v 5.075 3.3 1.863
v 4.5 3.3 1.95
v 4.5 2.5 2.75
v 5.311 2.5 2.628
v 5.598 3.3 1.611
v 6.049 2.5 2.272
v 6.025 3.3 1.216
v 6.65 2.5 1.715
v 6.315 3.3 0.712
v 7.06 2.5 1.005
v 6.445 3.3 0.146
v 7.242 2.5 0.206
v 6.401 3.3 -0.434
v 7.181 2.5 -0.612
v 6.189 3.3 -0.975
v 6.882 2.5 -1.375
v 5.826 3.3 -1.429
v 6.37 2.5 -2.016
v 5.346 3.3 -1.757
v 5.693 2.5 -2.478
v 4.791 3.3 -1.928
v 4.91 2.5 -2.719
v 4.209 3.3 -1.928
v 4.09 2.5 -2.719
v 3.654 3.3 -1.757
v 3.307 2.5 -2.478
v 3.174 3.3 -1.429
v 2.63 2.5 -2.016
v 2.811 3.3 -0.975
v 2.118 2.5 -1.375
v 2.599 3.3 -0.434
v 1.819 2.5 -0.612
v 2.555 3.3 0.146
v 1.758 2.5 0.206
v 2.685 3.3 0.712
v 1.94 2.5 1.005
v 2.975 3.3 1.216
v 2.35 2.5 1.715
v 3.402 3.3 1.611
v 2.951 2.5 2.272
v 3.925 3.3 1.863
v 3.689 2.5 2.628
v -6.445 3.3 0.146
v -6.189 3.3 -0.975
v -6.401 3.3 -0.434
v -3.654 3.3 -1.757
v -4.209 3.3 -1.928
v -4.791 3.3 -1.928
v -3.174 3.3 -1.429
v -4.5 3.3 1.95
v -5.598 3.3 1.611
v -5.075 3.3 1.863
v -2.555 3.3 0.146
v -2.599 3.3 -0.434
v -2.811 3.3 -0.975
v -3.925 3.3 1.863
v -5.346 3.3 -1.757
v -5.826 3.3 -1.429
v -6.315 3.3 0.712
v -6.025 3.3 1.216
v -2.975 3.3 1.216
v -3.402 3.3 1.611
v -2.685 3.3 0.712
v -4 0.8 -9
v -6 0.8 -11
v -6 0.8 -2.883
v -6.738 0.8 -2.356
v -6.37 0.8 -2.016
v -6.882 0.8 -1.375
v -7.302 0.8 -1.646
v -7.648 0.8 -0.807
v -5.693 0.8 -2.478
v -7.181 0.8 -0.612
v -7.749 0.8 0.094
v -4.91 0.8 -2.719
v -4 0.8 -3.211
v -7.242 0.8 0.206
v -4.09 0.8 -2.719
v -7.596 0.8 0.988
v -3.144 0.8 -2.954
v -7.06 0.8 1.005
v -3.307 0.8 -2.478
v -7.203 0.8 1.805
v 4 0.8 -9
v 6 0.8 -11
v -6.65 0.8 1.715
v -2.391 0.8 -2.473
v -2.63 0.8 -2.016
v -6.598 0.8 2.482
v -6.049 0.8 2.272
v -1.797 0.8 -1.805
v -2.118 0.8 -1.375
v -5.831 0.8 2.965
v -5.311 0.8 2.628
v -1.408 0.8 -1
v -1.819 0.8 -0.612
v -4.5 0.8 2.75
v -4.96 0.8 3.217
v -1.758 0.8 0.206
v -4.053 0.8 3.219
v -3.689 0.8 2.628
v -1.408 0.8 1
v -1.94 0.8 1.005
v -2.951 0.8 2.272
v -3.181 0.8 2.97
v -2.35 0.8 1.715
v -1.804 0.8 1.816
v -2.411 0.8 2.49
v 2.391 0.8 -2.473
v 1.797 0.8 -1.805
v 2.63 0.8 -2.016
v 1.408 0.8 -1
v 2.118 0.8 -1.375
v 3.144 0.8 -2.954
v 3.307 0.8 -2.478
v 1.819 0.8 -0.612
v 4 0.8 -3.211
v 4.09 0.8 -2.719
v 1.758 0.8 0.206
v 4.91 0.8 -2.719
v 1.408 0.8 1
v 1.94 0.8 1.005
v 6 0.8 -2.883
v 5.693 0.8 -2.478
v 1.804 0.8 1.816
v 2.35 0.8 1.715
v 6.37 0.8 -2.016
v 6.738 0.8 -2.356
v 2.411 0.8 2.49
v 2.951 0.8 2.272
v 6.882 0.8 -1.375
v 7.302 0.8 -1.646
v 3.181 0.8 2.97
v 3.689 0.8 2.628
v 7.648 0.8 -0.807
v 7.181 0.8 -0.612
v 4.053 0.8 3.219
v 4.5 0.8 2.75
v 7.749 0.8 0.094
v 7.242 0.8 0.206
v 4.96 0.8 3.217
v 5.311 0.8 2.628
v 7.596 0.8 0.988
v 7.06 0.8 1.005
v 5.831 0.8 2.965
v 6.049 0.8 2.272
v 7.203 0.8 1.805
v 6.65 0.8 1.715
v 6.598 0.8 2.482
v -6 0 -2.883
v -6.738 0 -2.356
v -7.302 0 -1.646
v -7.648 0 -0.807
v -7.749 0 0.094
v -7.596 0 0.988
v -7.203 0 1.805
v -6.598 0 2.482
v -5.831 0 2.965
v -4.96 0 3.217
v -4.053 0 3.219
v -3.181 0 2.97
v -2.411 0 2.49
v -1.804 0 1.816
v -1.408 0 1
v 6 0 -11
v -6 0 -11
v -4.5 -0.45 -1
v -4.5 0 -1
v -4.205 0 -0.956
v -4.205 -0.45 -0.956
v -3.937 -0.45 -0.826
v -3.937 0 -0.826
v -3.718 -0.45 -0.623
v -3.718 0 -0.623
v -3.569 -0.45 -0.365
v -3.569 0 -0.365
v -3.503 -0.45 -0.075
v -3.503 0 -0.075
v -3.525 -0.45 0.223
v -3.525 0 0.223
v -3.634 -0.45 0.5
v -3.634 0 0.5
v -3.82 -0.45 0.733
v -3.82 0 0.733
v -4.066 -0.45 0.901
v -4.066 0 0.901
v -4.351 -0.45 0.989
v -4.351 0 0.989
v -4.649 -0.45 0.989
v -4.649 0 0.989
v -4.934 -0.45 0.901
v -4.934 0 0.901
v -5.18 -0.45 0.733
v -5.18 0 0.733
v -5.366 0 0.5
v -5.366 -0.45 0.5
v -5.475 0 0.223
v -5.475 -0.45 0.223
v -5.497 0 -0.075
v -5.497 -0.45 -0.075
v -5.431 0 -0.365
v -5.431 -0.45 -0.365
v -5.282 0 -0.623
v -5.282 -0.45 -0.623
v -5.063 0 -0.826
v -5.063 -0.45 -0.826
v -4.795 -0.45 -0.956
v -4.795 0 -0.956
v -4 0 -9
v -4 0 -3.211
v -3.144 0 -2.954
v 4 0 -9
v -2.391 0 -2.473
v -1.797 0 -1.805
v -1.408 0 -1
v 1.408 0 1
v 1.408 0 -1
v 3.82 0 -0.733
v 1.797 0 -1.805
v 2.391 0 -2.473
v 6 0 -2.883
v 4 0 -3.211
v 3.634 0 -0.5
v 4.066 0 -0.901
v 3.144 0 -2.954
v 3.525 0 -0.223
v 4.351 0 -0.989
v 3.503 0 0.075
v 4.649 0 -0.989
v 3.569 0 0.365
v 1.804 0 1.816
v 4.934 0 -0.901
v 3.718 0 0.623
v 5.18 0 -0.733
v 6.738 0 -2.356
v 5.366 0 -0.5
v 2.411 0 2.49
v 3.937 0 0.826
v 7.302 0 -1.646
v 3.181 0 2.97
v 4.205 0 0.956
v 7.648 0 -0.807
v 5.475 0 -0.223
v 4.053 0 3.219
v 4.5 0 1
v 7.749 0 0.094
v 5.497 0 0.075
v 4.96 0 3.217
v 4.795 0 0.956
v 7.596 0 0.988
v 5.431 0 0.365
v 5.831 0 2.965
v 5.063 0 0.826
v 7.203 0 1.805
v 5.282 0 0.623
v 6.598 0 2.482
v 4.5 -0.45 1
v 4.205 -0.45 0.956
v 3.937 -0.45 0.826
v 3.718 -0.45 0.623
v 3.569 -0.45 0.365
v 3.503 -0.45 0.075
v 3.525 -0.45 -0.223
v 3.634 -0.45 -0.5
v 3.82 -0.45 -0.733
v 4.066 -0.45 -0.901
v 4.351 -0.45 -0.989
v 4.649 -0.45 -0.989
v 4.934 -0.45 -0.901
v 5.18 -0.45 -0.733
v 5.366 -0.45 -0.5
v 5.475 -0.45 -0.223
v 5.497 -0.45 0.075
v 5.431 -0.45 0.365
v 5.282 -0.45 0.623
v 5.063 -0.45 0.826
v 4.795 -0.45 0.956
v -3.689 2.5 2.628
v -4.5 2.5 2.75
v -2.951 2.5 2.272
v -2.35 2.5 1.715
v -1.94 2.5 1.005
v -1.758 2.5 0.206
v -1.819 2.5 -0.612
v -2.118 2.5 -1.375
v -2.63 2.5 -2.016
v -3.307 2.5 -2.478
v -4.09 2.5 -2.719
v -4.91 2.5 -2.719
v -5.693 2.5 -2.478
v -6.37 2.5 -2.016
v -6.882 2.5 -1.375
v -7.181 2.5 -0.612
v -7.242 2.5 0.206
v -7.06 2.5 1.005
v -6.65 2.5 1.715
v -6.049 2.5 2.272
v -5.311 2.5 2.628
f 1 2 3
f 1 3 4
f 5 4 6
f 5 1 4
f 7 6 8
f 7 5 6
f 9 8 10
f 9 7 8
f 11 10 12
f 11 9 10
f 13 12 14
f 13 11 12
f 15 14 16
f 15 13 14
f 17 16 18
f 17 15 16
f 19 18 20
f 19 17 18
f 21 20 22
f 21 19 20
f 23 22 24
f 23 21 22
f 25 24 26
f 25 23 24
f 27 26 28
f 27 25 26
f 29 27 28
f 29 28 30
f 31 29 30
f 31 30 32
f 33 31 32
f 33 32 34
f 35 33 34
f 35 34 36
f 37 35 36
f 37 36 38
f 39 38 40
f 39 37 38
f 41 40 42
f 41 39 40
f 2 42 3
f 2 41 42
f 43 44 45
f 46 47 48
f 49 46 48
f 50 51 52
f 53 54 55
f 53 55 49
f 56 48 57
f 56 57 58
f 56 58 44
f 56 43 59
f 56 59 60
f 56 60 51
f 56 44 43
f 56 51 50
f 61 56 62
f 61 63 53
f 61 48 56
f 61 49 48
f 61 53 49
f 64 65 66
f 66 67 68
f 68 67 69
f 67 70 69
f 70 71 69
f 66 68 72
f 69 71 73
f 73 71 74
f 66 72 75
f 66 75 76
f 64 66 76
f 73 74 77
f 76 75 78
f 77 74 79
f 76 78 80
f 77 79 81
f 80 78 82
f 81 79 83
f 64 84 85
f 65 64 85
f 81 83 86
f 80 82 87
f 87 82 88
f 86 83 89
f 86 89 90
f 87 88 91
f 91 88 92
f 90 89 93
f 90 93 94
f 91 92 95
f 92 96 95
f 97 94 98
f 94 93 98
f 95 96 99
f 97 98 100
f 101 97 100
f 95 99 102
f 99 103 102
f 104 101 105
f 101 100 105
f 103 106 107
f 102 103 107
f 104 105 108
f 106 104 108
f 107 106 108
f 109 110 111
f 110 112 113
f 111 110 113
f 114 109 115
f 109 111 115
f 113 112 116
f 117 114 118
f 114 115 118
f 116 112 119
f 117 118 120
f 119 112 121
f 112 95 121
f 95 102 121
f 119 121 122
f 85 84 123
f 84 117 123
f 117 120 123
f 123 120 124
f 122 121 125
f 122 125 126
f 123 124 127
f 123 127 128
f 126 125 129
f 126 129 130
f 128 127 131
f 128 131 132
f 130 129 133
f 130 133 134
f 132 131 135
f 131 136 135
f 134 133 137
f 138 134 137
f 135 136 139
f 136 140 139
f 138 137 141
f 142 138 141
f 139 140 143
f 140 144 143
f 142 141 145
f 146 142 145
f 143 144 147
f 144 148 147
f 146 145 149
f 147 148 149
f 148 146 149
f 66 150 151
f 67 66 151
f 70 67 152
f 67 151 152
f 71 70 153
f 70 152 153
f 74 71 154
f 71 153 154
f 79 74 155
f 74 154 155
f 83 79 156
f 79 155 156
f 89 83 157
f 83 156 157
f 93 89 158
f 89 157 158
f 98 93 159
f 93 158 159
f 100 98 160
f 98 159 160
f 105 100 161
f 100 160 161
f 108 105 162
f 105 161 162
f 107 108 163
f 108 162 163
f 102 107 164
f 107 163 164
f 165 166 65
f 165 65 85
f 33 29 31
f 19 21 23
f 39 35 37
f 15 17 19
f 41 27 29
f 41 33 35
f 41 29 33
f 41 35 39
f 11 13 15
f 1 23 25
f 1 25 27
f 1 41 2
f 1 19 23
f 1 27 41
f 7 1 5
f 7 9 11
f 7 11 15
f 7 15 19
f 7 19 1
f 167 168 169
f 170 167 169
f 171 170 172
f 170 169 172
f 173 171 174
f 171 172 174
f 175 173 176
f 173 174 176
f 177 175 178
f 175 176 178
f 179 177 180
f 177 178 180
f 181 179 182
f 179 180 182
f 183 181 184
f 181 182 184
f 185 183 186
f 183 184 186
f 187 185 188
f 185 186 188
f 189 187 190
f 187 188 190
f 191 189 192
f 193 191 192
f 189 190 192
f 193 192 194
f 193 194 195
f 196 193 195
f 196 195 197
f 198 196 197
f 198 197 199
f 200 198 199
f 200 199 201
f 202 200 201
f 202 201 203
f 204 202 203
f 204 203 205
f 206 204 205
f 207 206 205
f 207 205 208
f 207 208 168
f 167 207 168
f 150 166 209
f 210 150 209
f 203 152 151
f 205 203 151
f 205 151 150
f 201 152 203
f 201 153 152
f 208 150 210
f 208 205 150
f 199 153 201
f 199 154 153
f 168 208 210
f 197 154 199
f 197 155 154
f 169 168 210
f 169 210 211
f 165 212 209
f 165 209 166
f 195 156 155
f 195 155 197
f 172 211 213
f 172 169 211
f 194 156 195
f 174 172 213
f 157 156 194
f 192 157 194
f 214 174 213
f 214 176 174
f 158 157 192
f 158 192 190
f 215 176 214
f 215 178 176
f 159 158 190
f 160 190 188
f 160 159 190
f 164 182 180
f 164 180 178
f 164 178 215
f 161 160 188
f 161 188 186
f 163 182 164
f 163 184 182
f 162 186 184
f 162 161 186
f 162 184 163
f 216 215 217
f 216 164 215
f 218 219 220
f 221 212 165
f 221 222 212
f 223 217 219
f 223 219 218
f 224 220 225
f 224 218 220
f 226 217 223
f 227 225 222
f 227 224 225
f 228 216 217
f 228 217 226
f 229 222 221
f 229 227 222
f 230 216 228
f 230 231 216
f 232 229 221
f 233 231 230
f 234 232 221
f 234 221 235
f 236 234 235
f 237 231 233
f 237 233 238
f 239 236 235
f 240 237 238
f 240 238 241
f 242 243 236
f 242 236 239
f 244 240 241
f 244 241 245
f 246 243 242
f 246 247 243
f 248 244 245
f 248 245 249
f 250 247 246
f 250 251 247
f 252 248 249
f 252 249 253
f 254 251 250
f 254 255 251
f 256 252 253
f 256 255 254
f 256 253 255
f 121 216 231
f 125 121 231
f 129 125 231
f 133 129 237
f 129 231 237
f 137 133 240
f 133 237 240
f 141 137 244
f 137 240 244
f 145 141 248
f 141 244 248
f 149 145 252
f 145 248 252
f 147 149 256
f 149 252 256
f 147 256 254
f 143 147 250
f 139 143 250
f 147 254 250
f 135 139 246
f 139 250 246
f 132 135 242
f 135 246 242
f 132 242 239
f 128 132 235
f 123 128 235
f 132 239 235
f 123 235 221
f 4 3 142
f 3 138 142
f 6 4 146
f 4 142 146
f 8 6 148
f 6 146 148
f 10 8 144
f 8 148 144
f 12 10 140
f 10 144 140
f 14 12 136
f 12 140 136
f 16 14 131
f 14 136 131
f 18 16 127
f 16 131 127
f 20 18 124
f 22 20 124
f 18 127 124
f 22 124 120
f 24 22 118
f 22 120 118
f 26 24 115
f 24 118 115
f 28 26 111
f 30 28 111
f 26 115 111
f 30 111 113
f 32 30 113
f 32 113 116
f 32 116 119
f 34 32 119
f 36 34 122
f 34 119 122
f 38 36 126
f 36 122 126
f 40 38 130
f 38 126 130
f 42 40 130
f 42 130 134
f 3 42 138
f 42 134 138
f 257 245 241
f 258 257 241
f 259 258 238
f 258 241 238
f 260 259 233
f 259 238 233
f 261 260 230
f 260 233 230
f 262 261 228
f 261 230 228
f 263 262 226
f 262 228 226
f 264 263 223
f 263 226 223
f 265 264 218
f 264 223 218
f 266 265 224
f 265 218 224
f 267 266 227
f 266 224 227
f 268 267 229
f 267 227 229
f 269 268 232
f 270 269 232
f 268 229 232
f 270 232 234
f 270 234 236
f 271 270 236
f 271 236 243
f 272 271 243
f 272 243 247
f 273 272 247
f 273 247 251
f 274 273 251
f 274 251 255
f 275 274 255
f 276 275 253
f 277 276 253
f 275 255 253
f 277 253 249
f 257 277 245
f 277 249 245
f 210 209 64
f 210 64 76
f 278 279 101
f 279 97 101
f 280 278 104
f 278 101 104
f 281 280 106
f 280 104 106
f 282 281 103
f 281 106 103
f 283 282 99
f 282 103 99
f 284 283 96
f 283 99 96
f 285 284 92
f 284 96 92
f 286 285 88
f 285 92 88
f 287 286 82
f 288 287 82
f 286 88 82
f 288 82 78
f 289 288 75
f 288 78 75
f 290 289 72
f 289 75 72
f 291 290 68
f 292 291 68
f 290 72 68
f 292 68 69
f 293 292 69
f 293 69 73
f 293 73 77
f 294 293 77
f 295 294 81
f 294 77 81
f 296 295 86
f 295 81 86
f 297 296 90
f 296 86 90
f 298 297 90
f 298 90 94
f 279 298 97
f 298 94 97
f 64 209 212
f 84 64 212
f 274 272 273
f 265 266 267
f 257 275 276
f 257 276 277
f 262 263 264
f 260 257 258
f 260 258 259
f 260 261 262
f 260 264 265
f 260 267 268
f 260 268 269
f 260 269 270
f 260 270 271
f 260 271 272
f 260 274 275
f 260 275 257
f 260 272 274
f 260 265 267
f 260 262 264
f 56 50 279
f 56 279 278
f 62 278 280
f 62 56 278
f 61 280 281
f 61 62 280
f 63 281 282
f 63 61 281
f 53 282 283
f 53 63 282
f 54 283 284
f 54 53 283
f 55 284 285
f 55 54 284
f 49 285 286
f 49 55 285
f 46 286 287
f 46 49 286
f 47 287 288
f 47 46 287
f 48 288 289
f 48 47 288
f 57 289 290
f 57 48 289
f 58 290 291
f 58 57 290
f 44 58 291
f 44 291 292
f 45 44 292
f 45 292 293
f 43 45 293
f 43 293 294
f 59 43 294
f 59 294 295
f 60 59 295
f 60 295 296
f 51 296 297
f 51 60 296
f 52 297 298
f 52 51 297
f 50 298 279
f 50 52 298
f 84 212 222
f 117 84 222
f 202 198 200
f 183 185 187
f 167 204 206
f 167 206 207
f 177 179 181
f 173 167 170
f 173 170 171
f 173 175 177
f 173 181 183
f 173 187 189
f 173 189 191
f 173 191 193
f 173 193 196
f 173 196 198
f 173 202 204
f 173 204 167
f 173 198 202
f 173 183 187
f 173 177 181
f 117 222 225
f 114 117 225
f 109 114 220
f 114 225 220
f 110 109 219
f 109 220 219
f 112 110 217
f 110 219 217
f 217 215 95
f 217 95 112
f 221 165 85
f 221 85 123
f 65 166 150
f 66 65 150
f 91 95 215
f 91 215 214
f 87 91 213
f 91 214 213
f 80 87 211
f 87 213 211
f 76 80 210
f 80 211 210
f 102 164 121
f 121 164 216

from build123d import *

# Parameters (mm, degrees)
SKETCH_1_R      = 3.25
EXTRUDE_1_DEPTH = 0.8
SKETCH_2_R      = 2.75
EXTRUDE_2_DEPTH = 2.5
CHAMFER_1_SIZE  = 0.8
SKETCH_3_R      = 1
EXTRUDE_3_DEPTH = 0.45
SKETCH_4_W      = 12
SKETCH_4_H      = 12
SKETCH_4_W_2    = 8
SKETCH_4_H_2    = 8
EXTRUDE_4_DEPTH = 0.8


with BuildPart() as part:
    # 草图1 → 凸台-拉伸1 (new body)
    with BuildSketch(Plane(origin=(0, 0, 0), x_dir=(1, 0, 0), z_dir=(0, 1, 0))):
        with Locations((-4.5, 0)):
            Circle(SKETCH_1_R)
        with BuildLine():
            Line((1.33772234, 0.75), (-1.33772234, 0.75))
            ThreePointArc((-1.33772234, 0.75), (-1.272005081, 0.377556356), (-1.25, 0))
            ThreePointArc((-1.25, 0), (-1.272005081, -0.377556356), (-1.33772234, -0.75))
            Line((-1.33772234, -0.75), (1.33772234, -0.75))
            ThreePointArc((1.33772234, -0.75), (1.25, 0), (1.33772234, 0.75))
        make_face()
        with Locations((4.5, 0)):
            Circle(SKETCH_1_R)
    extrude(amount=EXTRUDE_1_DEPTH)

    # 草图2 → 凸台-拉伸2 (add)
    with BuildSketch(Plane(origin=(0, 0.8, 0), x_dir=(1, 0, 0), z_dir=(0, 1, 0))):
        with Locations(Location((-4.5, 0, 0), (0, 0, 270))):
            Circle(SKETCH_2_R)
        with Locations(Location((4.5, 0, 0), (0, 0, 270))):
            Circle(SKETCH_2_R)
    extrude(amount=EXTRUDE_2_DEPTH)

    # 倒角1
    chamfer_1_edges = [part.edges().sort_by_distance(p)[0] for p in [
        (-4.5, 3.3, -2.75),
        (4.5, 3.3, -2.75),
    ]]
    chamfer(chamfer_1_edges, length=CHAMFER_1_SIZE)

    # 草图3 → 凸台-拉伸3 (add)
    with BuildSketch(Plane.XZ):
        with Locations(Location((-4.5, 0, 0), (0, 0, 270))):
            Circle(SKETCH_3_R)
        with Locations(Location((4.5, 0, 0), (0, 0, 90))):
            Circle(SKETCH_3_R)
    extrude(amount=EXTRUDE_3_DEPTH)

    # 草图4 → 凸台-拉伸4 (add)
    with BuildSketch(Plane.XZ):
        with Locations((0, -5)):
            Rectangle(SKETCH_4_W, SKETCH_4_H)
        with Locations((0, -5)):
            Rectangle(SKETCH_4_W_2, SKETCH_4_H_2, mode=Mode.SUBTRACT)
    extrude(amount=-EXTRUDE_4_DEPTH)


solid = part.part
